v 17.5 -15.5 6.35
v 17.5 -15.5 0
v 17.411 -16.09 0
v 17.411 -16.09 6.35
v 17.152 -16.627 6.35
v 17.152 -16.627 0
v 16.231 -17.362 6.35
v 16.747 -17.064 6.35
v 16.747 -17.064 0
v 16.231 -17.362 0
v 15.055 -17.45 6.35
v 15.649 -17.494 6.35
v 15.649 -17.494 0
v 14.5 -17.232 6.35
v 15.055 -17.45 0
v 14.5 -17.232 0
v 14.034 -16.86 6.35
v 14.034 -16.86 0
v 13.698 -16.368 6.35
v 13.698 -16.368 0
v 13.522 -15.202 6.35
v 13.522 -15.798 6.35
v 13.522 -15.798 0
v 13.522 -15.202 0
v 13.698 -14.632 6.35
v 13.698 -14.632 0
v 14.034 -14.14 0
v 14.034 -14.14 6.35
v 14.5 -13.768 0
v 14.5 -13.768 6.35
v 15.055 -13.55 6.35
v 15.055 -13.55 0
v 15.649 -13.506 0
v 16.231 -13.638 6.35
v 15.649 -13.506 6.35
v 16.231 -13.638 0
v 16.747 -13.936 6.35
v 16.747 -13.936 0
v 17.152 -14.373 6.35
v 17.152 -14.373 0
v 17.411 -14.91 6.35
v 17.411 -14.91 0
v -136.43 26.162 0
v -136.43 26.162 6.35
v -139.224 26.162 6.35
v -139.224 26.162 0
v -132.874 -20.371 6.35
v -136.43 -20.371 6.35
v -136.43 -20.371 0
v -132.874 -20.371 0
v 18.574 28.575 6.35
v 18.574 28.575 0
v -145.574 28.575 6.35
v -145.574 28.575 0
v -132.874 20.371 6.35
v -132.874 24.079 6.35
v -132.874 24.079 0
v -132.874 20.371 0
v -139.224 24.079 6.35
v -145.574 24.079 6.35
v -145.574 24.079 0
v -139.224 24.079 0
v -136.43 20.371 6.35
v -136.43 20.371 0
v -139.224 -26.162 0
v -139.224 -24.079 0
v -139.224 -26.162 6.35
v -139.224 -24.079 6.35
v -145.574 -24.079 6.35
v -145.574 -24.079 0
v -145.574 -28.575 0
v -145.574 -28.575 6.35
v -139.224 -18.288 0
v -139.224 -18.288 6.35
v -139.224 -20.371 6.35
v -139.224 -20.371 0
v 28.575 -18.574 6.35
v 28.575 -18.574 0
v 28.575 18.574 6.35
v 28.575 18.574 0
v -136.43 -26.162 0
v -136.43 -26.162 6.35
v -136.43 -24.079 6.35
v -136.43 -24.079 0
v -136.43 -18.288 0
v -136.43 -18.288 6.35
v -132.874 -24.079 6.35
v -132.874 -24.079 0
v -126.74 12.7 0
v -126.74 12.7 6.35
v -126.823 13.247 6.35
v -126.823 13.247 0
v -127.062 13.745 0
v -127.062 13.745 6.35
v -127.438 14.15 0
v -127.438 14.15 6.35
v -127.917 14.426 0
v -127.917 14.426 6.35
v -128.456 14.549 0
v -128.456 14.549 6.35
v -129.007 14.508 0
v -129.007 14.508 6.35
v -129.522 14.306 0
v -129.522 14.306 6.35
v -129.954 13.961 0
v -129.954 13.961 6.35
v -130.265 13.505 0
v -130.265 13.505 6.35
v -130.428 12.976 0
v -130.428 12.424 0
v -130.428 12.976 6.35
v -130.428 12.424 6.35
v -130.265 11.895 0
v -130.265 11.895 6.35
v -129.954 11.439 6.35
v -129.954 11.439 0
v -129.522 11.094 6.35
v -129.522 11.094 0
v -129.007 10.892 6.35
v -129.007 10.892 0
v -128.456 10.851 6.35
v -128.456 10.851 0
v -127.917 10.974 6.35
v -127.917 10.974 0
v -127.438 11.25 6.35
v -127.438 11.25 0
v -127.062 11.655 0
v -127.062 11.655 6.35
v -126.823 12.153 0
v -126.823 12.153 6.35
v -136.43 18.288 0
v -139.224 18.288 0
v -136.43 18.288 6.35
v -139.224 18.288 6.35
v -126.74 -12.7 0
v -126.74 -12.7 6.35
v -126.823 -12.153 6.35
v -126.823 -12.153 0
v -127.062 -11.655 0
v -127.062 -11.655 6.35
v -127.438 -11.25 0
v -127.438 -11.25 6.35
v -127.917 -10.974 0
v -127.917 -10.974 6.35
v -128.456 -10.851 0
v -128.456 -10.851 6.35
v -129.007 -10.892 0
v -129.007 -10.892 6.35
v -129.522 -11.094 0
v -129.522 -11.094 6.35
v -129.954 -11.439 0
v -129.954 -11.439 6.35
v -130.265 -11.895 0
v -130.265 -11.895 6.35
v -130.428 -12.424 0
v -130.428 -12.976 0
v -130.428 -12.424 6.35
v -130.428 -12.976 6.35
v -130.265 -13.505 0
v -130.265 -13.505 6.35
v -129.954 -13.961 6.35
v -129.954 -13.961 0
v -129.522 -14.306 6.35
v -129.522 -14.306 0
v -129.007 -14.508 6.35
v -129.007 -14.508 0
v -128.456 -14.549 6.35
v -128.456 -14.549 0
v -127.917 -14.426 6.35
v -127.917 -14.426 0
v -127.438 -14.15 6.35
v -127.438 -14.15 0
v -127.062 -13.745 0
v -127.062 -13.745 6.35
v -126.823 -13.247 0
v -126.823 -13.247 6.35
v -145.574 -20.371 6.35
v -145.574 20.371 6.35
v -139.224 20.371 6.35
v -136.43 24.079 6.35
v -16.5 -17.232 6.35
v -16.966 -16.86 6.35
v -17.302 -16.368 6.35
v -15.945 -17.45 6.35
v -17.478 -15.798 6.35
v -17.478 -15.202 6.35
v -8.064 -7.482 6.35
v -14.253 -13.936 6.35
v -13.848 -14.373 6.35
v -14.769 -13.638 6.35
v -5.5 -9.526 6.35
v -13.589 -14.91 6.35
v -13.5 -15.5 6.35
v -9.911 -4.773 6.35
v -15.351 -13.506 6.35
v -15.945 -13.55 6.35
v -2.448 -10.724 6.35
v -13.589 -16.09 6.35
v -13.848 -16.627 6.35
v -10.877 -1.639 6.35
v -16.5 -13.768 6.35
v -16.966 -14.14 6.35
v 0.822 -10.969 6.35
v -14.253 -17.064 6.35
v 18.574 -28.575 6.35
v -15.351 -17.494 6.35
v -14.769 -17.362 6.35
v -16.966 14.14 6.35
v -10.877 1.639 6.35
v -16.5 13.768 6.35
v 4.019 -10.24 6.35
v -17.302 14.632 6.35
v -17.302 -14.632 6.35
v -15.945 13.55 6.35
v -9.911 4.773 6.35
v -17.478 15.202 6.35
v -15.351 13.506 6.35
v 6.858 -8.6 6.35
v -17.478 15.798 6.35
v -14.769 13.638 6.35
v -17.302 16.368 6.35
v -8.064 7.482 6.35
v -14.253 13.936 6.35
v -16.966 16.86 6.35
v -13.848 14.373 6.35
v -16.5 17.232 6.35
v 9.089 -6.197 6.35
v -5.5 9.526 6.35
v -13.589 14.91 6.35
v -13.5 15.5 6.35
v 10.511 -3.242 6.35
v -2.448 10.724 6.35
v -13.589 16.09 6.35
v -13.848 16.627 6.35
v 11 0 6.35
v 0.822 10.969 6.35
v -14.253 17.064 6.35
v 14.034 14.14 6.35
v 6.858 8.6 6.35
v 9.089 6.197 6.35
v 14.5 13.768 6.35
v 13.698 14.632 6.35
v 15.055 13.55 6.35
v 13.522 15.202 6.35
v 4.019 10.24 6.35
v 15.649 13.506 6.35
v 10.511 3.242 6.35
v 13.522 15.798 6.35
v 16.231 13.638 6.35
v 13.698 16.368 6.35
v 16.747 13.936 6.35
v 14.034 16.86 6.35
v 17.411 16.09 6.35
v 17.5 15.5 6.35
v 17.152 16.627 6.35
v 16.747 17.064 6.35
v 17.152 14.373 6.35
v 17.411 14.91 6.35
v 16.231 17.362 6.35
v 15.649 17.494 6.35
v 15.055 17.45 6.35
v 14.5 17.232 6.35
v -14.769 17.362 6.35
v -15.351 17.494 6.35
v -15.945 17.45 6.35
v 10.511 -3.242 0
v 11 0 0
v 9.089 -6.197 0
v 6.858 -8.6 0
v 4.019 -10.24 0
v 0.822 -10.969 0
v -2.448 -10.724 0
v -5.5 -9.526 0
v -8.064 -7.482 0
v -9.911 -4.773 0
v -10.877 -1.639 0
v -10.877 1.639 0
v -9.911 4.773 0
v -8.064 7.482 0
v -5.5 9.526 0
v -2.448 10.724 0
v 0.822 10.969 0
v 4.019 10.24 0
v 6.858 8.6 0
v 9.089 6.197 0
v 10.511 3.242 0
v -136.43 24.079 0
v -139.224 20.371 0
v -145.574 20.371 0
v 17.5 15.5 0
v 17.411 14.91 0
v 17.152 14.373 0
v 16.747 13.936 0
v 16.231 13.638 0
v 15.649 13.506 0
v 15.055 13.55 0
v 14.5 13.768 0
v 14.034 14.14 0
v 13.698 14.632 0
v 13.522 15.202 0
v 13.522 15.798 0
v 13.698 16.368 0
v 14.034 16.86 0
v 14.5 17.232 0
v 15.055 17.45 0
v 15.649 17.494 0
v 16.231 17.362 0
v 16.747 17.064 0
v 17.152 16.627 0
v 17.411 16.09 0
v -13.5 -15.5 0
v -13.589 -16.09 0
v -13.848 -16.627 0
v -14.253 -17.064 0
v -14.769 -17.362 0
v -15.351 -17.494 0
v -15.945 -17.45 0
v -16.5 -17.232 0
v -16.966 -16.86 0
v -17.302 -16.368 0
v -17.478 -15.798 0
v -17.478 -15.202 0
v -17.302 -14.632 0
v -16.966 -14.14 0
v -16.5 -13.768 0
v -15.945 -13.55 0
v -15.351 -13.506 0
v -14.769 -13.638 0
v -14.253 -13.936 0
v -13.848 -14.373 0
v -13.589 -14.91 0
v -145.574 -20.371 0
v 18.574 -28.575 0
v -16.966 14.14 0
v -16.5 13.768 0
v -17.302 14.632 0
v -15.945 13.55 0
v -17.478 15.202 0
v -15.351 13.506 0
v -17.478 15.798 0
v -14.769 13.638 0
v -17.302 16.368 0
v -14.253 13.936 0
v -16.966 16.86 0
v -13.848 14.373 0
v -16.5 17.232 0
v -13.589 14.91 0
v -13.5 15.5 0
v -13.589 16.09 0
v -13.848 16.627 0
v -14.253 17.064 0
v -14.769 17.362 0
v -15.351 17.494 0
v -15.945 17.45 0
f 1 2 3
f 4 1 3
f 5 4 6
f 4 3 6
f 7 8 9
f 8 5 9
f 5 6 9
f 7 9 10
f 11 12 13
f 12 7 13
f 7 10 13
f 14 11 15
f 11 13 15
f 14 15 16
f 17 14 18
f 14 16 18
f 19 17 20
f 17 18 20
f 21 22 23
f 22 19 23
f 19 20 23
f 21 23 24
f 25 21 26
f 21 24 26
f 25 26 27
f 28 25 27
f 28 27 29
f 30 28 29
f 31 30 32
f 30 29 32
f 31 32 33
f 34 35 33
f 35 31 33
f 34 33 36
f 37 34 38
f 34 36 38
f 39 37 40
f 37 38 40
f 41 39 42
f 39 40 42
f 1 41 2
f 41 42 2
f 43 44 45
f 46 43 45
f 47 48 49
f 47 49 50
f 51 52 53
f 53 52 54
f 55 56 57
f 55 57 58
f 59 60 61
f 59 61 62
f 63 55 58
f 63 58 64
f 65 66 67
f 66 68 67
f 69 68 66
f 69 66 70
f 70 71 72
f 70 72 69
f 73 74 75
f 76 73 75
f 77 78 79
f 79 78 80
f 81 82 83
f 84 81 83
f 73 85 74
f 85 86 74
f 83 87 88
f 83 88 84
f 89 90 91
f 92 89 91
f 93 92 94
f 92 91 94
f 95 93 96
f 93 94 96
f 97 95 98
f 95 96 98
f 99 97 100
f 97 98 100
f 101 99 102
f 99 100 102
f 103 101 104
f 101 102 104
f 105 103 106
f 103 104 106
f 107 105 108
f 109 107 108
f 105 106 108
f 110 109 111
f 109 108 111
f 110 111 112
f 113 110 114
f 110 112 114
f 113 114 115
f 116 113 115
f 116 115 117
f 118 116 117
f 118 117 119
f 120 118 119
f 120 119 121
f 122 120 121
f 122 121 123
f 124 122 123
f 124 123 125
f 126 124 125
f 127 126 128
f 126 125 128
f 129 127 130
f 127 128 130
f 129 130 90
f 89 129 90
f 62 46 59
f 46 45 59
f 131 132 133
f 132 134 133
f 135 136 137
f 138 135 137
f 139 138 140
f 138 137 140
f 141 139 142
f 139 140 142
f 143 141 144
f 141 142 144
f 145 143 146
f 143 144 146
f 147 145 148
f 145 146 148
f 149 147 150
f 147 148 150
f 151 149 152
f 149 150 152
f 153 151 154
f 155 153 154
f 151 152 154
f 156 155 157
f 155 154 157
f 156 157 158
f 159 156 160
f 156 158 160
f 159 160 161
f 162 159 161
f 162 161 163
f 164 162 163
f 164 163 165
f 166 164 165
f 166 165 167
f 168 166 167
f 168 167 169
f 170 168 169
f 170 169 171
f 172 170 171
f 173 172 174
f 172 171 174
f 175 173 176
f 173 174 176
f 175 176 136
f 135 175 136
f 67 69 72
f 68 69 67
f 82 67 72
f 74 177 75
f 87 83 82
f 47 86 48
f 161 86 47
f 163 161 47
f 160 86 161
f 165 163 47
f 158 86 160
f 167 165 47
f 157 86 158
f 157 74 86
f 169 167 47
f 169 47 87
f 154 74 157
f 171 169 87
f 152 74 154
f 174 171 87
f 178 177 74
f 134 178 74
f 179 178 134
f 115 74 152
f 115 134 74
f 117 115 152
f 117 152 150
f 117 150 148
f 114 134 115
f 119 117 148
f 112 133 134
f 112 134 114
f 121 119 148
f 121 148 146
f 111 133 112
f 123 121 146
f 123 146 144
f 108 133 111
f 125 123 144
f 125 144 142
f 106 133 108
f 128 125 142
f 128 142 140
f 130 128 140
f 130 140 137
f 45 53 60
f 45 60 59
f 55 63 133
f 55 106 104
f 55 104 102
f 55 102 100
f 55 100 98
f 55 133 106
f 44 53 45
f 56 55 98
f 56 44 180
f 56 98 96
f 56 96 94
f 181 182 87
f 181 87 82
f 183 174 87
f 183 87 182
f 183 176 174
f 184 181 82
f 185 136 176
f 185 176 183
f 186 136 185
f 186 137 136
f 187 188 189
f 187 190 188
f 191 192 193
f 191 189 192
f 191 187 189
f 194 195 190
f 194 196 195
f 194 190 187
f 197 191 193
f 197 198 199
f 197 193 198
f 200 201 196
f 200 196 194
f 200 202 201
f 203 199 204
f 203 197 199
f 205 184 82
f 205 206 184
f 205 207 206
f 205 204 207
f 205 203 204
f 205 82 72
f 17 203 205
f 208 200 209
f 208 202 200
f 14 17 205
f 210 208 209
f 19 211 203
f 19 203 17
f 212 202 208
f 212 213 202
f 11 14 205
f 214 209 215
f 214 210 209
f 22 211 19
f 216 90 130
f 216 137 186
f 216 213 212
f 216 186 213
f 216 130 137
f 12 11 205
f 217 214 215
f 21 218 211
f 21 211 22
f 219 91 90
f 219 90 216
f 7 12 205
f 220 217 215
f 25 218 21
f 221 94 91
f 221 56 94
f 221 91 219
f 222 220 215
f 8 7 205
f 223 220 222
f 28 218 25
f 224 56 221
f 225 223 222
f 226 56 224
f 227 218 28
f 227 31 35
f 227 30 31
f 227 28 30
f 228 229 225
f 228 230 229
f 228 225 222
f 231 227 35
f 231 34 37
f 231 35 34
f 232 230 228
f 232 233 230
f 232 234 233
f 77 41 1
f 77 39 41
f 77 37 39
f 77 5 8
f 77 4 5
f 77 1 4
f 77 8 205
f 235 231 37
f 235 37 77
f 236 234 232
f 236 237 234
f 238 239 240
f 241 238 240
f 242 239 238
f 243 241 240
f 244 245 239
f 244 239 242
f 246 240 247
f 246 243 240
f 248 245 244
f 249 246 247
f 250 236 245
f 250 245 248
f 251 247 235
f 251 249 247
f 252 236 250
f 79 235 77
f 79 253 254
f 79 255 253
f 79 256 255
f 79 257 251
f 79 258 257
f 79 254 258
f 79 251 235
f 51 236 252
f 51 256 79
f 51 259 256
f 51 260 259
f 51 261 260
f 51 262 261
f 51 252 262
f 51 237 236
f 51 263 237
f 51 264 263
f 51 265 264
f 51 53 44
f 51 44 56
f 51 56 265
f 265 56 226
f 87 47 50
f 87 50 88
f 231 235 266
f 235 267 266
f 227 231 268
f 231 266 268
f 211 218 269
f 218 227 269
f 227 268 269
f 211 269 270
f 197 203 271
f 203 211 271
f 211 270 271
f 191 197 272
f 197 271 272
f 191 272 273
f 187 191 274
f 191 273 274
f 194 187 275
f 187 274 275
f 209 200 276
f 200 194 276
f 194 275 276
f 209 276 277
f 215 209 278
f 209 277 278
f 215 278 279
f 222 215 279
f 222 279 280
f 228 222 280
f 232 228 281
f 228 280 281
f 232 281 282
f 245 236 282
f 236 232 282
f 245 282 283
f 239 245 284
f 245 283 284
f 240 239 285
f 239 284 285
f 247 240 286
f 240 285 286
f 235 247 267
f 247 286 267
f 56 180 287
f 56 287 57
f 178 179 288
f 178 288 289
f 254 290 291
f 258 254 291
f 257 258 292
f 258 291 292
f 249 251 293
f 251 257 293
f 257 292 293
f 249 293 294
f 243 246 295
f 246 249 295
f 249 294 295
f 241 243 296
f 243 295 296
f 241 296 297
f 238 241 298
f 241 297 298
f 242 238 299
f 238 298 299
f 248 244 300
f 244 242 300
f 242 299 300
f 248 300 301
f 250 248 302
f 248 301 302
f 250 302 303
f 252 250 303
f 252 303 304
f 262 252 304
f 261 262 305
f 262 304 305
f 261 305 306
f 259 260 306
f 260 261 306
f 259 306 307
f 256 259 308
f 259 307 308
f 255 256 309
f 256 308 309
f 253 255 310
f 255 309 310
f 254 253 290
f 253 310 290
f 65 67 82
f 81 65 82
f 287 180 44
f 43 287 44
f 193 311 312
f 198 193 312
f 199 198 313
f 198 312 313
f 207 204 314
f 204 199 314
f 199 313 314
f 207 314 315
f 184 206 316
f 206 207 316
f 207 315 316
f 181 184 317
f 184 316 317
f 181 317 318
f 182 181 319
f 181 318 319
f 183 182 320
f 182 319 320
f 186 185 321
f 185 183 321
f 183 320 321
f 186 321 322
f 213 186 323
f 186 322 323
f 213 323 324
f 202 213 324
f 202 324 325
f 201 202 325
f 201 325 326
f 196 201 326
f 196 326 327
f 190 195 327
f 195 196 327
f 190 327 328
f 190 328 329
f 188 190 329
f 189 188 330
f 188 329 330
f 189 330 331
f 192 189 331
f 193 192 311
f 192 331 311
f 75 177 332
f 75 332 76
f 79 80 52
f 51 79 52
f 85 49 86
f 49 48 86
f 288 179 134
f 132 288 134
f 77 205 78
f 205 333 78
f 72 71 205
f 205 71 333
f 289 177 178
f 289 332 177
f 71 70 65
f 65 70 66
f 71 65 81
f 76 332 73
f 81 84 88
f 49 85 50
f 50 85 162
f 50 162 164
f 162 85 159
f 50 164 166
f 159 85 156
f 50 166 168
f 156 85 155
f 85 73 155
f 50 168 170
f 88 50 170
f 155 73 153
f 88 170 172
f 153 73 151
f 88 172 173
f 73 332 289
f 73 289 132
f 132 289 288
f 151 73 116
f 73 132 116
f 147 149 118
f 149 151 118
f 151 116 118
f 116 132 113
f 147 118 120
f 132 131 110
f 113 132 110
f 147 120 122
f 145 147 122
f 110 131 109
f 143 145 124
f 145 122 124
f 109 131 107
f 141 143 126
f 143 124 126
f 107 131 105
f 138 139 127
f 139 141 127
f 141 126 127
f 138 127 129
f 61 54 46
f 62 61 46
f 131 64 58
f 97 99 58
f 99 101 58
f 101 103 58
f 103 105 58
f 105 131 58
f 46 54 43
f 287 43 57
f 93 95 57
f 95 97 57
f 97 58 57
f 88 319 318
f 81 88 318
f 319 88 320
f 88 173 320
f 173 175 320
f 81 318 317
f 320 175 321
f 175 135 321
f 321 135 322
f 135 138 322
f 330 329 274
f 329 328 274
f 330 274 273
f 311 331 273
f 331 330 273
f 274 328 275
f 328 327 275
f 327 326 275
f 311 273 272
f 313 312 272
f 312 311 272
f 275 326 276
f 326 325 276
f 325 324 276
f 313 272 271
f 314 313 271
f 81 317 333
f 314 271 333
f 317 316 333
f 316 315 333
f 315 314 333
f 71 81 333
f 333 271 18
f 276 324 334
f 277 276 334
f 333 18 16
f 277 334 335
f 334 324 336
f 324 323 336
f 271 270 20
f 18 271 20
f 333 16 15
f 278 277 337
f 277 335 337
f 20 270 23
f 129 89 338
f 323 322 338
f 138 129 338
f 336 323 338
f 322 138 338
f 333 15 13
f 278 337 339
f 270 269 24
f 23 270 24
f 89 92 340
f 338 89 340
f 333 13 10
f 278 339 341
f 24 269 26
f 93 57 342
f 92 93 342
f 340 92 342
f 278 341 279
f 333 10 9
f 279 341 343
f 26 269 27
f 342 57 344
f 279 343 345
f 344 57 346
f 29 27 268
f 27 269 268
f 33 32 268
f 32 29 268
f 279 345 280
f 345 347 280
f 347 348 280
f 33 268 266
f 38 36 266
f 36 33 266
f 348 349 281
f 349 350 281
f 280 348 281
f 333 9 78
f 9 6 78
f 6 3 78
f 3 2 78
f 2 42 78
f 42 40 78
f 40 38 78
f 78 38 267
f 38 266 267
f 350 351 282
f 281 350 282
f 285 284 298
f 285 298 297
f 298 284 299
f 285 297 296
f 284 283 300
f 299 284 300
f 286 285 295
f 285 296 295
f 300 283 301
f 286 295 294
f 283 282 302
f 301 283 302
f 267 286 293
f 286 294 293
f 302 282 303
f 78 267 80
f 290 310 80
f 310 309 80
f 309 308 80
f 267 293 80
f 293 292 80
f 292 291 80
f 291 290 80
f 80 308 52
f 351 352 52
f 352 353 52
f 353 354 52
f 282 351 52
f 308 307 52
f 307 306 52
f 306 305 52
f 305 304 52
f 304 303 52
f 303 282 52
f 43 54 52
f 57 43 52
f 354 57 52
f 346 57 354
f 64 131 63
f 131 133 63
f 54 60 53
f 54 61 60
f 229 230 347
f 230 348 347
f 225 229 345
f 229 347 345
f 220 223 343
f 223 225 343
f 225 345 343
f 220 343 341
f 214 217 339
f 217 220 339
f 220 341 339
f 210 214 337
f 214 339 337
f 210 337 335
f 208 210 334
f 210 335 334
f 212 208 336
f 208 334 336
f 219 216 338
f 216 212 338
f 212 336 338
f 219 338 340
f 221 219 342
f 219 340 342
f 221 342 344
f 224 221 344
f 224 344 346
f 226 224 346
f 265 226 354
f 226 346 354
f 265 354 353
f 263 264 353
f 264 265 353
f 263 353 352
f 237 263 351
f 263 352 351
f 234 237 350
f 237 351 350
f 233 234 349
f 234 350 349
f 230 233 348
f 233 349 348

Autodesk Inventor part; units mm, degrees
ref_plane "YZ Plane" through (0, 0, 0) normal (1, 0, 0) x (0, 1, 0)
ref_plane "XZ Plane" through (0, 0, 0) normal (0, 1, 0) x (-1, 0, 0)
ref_plane "XY Plane" through (0, 0, 0) normal (0, 0, 1) x (1, 0, 0)
sketch "Sketch1" plane through (0, 0, 0) normal (0, 0, 1) x (1, 0, 0)
  circle A0 centre (15.5, -15.5) radius 2 projected
  circle A1 centre (-15.5, -15.5) radius 2 projected
  circle A2 centre (15.5, 15.5) radius 2 projected
  circle A3 centre (-15.5, 15.5) radius 2 projected
  line L0 (-21.15, 15.4985) -> (-15.4985, 21.15) projected
  line L1 (-15.4985, 21.15) -> (15.4985, 21.15) projected
  line L2 (15.4985, 21.15) -> (21.15, 15.4985) projected
  line L3 (21.15, 15.4985) -> (21.15, -15.4985) projected
  line L4 (21.15, -15.4985) -> (15.4985, -21.15) projected
  line L5 (15.4985, -21.15) -> (-15.4985, -21.15) projected
  line L6 (-15.4985, -21.15) -> (-21.15, -15.4985) projected
  line L7 (-21.15, -15.4985) -> (-21.15, 15.4985) projected
  line L8 (28.575, -18.574) -> (28.575, 18.574)
  line L9 (28.575, 18.574) -> (18.574, 28.575)
  line L10 (18.574, 28.575) -> (-18.574, 28.575)
  line L11 (-18.574, 28.575) -> (-28.575, 18.574)
  line L12 (-28.575, 18.574) -> (-28.575, -18.574)
  line L13 (-28.575, -18.574) -> (-18.574, -28.575)
  line L14 (-18.574, -28.575) -> (18.574, -28.575)
  line L15 (18.574, -28.575) -> (28.575, -18.574)
  line L16 (-18.574, -28.575) -> (-145.574, -28.575)
  line L17 (-145.574, -28.575) -> (-145.574, 28.575)
  line L18 (-145.574, 28.575) -> (-18.574, 28.575)
  line L19 (-18.574, 28.575) -> (-18.574, -28.575)
  circle A4 centre (0, 0) radius 11 projected
  dimension "d0" = 127
  dimension "d1" = 57.15
  dimension "d2" = 57.15
extrude "Extrusion1" add sketch "Sketch1" along normal blind 6.35
sketch "Sketch2" plane through (0, 0, 6.35) normal (0, 0, 1) x (1, 0, 0)
  line L0 (-130.4486, -16.3493) -> (-130.4486, -9.9993) projected
  line L1 (-126.7402, -9.9993) -> (-126.7402, -16.3493) projected
  line L2 (-130.4486, 9.0507) -> (-130.4486, 15.4007) projected
  line L3 (-126.7402, 15.4007) -> (-126.7402, 9.0507) projected
  line L4 (-126.7402, 12.7) -> (-130.4486, 12.7) construction
  line L5 (-126.7402, -12.7) -> (-130.9009, -12.7) construction
  circle A0 centre (-128.5944, 12.7) radius 1.8542
  circle A1 centre (-128.5944, -12.7) radius 1.8542
  dimension "d5" = 3.7084
  dimension "d6" = 3.7084
extrude "Extrusion2" cut sketch "Sketch2" against normal through all
sketch "Sketch3" plane through (0, 0, 6.35) normal (0, 0, 1) x (1, 0, 0)
  line L0 (-145.574, -28.575) -> (-145.574, 28.575) projected
  line L1 (-151.924, 20.3708) -> (-151.924, 24.0792) projected
  line L2 (-151.924, -24.5535) -> (-151.924, -20.8451) projected
  line L3 (-131.1543, 22.225) -> (-145.574, 22.225) construction
  line L4 (-131.1543, -22.225) -> (-145.574, -22.225) construction
  line L5 (-145.574, -20.3708) -> (-132.874, -20.3708)
  line L6 (-132.874, -20.3708) -> (-132.874, -24.0792)
  line L7 (-132.874, -24.0792) -> (-145.574, -24.0792)
  line L8 (-145.574, -24.0792) -> (-145.574, -20.3708)
  line L9 (-145.574, 24.0792) -> (-132.874, 24.0792)
  line L10 (-132.874, 24.0792) -> (-132.874, 20.3708)
  line L11 (-132.874, 20.3708) -> (-145.574, 20.3708)
  line L12 (-145.574, 20.3708) -> (-145.574, 24.0792)
  line L13 (-136.43, 26.162) -> (-139.224, 26.162)
  line L14 (-139.224, 26.162) -> (-139.224, 18.288)
  line L15 (-139.224, 18.288) -> (-136.43, 18.288)
  line L16 (-136.43, 18.288) -> (-136.43, 26.162)
  line L17 (-136.43, -18.288) -> (-139.224, -18.288)
  line L18 (-139.224, -18.288) -> (-139.224, -26.162)
  line L19 (-139.224, -26.162) -> (-136.43, -26.162)
  line L20 (-136.43, -26.162) -> (-136.43, -18.288)
  dimension "d9" = 12.7
  dimension "d10" = 2.794
  dimension "d11" = 7.874
  dimension "d12" = 3.937
  dimension "d13" = 3.937
  dimension "d14" = 7.874
  dimension "d15" = 3.937
  dimension "d16" = 3.937
  dimension "d17" = 6.35
  dimension "d18" = 6.35
  dimension "d19" = 2.794
extrude "Extrusion3" cut sketch "Sketch3" against normal through all
equation "\"d2\" = d1"
equation "\"d12\" = d13"
equation "\"d15\" = d16"
properties part number "tiltColumnNonStepperSide02" material "Titanium"
